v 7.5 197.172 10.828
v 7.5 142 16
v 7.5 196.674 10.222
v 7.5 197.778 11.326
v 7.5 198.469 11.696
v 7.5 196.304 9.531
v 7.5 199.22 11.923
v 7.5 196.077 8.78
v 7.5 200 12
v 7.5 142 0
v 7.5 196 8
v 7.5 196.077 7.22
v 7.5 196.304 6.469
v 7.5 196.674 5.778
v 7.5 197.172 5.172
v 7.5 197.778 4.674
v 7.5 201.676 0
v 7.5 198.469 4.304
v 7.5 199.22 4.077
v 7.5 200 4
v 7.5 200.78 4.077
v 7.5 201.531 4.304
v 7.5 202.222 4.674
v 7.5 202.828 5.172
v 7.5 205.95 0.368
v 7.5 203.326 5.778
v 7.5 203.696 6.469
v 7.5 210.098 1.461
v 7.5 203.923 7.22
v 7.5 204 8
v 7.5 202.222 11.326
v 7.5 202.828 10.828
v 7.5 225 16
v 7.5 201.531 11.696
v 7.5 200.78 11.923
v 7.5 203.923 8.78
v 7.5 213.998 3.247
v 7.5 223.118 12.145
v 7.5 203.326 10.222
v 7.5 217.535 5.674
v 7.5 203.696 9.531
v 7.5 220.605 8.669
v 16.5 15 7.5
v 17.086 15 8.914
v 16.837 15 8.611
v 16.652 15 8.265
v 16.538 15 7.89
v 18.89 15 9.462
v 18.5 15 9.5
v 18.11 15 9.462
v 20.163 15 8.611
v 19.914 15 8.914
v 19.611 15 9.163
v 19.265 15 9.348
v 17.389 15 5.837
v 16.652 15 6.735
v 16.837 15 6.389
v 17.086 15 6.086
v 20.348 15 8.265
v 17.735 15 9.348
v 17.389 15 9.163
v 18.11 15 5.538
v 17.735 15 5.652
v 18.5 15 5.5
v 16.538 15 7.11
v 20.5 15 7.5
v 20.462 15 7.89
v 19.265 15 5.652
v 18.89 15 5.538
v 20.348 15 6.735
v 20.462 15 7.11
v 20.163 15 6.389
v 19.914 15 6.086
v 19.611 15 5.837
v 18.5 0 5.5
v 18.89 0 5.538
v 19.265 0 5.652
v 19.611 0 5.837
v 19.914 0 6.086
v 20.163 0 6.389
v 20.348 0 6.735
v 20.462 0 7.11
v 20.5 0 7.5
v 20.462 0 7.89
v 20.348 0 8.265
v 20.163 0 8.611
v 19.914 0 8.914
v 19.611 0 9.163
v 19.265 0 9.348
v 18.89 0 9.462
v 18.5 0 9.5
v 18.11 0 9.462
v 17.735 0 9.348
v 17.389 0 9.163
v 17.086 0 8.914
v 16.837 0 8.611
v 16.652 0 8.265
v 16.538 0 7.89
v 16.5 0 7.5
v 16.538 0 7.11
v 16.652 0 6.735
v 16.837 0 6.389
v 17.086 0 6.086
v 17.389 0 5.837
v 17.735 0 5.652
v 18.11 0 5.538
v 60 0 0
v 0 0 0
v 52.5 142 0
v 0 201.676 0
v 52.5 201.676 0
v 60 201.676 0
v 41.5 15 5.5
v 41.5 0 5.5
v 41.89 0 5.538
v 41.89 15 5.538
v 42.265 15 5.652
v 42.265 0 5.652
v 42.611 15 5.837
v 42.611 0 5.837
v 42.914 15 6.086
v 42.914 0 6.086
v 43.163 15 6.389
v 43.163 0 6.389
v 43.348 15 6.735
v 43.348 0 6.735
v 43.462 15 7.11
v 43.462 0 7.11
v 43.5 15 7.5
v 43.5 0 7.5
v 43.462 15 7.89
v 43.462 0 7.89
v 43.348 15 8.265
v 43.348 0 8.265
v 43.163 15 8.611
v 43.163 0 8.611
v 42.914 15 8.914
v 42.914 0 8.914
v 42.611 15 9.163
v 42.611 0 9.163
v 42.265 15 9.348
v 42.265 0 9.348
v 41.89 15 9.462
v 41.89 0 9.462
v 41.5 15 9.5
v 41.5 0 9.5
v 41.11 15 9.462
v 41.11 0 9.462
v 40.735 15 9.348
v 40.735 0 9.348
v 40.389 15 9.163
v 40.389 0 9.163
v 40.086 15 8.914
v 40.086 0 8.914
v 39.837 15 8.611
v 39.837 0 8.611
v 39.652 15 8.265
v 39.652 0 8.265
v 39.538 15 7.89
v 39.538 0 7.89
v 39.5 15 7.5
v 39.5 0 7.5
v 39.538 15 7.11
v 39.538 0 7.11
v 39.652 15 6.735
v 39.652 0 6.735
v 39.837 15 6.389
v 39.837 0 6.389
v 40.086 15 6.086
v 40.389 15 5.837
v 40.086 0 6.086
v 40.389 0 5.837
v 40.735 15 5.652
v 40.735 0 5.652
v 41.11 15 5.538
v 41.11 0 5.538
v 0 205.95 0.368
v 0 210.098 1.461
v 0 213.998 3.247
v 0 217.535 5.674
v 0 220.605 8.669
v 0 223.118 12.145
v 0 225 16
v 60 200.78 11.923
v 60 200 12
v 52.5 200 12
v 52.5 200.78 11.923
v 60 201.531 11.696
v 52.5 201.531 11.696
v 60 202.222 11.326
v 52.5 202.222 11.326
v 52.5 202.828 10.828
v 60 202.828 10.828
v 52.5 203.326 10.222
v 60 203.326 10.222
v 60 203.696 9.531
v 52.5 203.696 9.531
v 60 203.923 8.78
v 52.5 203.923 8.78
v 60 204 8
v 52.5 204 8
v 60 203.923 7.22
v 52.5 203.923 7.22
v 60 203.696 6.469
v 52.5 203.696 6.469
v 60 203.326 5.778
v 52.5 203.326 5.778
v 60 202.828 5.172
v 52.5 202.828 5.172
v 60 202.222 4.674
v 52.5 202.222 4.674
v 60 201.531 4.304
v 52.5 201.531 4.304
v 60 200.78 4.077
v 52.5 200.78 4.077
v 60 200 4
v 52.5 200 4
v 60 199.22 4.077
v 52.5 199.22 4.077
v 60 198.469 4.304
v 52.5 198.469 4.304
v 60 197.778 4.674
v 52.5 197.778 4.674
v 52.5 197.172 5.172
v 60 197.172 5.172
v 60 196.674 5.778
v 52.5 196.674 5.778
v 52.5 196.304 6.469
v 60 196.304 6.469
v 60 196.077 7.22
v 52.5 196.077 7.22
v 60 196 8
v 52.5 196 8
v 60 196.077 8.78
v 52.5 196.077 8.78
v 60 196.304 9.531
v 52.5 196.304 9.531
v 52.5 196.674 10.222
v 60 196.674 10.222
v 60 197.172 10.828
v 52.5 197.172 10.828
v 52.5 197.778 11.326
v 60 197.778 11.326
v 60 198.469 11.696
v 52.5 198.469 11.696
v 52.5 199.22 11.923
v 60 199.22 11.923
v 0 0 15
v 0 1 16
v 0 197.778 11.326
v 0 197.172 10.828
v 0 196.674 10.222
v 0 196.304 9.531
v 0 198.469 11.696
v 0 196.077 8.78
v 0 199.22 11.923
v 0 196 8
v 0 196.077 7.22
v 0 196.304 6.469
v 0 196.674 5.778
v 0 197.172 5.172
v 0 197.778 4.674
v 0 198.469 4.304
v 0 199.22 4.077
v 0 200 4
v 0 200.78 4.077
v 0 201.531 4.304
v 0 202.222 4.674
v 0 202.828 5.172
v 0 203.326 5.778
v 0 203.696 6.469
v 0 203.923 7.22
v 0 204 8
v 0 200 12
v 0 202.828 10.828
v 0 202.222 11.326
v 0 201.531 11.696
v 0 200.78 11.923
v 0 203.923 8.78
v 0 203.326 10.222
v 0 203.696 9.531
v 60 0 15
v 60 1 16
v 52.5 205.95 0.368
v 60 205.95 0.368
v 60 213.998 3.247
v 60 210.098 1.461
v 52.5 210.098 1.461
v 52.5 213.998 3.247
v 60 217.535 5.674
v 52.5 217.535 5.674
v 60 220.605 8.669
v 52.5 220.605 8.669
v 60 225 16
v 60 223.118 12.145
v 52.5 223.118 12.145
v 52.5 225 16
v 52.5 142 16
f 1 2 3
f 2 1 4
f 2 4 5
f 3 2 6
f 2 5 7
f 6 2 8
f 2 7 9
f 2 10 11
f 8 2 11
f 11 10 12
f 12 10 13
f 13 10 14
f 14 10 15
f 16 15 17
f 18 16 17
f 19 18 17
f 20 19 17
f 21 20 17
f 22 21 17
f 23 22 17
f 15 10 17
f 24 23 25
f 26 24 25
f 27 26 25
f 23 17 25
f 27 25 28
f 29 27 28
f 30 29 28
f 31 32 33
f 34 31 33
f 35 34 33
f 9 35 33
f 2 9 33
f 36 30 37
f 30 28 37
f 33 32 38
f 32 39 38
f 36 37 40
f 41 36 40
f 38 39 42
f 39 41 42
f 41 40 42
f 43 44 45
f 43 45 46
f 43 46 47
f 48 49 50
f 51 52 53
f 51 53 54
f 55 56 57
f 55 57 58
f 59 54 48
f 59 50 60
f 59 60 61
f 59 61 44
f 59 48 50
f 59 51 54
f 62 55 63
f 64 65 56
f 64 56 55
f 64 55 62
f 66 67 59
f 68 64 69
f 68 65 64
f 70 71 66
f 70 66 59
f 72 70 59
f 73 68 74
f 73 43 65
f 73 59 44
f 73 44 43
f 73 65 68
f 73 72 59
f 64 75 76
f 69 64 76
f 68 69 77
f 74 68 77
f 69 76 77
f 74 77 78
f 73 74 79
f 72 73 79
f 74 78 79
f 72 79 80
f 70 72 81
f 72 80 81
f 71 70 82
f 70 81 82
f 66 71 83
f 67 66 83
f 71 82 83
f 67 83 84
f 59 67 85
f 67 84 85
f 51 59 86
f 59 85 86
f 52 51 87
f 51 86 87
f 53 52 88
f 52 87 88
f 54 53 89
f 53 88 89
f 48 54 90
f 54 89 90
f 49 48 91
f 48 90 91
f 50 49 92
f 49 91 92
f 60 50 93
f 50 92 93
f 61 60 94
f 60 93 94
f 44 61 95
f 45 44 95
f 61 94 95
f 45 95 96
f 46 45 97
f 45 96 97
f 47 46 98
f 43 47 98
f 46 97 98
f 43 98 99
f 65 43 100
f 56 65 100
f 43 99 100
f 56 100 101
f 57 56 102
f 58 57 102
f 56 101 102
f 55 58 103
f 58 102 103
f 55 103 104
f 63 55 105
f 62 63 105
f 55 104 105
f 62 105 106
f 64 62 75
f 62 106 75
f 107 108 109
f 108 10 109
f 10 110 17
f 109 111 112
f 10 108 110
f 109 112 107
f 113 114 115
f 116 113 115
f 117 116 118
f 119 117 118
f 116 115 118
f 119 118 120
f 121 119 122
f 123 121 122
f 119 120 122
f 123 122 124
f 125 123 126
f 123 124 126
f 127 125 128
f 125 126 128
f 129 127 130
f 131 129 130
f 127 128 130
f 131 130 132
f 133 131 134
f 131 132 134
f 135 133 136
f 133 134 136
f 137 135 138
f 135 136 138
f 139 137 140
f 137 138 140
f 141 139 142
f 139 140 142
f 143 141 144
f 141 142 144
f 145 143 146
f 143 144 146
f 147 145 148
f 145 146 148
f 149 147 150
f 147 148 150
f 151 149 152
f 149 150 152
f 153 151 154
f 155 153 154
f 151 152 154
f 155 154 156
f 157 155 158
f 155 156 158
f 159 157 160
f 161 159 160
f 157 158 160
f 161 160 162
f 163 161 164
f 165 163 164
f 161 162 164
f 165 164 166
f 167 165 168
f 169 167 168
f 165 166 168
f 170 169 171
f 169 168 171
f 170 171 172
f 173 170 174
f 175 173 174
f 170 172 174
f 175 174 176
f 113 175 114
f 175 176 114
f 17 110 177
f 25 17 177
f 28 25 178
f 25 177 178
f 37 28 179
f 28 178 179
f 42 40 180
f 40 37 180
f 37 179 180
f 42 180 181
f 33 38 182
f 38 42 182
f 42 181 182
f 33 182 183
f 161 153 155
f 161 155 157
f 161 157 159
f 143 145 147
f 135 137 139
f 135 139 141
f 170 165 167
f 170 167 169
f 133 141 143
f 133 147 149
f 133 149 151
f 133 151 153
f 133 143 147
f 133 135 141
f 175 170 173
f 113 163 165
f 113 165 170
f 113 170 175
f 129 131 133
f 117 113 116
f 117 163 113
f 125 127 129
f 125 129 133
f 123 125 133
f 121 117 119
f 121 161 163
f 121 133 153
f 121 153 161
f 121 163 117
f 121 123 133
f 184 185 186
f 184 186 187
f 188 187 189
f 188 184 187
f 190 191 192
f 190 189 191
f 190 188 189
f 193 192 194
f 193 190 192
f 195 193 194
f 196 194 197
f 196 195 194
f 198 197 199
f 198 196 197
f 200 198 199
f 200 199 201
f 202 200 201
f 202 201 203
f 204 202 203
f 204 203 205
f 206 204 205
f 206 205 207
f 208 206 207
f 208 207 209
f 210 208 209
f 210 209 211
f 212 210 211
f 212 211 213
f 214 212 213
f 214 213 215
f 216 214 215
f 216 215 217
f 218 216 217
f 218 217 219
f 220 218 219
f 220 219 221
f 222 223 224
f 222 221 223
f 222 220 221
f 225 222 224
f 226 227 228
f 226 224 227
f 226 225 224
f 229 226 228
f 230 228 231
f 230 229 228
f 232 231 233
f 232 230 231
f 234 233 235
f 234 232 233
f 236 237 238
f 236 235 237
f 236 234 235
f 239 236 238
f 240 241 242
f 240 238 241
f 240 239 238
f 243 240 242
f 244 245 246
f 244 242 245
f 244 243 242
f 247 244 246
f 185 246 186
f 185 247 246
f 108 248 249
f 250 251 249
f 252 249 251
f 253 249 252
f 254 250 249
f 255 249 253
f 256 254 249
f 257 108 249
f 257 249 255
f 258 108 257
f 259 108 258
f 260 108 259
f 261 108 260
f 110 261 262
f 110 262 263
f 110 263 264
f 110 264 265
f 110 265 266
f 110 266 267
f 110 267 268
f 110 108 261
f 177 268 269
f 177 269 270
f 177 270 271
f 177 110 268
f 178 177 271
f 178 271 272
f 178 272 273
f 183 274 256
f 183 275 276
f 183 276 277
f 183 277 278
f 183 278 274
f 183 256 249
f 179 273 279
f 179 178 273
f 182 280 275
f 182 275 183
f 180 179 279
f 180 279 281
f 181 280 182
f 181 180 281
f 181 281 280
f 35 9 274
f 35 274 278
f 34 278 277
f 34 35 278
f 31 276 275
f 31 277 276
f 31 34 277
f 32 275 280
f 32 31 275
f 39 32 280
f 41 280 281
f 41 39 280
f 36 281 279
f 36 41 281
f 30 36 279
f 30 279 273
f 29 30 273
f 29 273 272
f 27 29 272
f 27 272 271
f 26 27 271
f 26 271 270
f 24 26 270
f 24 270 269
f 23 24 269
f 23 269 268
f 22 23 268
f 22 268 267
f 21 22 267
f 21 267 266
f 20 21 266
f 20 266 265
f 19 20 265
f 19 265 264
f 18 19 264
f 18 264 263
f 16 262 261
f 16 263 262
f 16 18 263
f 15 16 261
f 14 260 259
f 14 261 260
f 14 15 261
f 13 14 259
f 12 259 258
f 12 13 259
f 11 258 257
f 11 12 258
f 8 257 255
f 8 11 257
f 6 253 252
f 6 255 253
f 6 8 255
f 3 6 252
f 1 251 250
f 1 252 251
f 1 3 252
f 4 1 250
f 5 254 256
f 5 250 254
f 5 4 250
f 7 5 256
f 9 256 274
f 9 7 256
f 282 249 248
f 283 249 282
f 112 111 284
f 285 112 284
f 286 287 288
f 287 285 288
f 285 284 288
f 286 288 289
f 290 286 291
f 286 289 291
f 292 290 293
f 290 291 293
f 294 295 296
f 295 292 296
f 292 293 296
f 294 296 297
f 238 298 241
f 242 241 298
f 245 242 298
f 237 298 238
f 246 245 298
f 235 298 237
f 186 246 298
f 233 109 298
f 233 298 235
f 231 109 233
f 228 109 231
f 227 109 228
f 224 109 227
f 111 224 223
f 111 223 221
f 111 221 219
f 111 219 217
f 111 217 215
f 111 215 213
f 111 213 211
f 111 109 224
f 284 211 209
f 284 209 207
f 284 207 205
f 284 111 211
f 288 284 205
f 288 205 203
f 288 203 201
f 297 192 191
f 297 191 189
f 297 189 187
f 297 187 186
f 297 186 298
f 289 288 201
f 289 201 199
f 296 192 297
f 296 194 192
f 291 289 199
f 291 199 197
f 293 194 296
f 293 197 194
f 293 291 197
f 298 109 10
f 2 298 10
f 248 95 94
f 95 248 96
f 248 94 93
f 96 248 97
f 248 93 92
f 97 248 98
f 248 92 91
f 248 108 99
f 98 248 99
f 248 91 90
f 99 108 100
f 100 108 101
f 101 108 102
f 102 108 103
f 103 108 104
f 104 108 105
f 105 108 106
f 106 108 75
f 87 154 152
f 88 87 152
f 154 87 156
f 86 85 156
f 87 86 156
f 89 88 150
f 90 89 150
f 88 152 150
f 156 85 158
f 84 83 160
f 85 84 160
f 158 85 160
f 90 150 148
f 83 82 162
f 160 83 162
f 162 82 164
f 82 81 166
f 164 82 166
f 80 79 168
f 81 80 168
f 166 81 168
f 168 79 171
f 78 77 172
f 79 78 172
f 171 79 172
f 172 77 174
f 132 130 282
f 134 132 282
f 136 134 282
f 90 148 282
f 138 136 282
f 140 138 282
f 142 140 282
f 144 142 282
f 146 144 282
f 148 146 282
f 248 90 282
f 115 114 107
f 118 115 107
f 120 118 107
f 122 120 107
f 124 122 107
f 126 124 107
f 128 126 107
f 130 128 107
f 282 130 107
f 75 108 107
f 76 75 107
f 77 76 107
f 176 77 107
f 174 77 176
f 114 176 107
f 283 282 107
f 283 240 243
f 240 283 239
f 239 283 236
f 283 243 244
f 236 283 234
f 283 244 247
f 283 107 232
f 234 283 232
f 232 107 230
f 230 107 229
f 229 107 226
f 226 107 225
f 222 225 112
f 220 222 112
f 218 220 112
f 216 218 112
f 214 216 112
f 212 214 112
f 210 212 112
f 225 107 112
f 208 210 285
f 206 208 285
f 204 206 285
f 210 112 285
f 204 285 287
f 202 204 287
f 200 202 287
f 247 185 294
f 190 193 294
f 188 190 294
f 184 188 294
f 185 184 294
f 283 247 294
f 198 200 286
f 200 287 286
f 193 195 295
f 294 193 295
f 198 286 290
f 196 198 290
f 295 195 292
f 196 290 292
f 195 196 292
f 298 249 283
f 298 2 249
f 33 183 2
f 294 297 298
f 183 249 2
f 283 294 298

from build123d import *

# Parameters (mm, degrees)
SKETCH1_W               = 60
SKETCH1_H               = 250
BOSS_EXTRUDE1_DEPTH     = 16
CHAMFER2_SIZE           = 1
SKETCH2_R               = 2
CUT_EXTRUDE1_DEPTH      = 15
SKETCH3_W               = 45
SKETCH3_H               = 50
CUT_EXTRUDE2_DEPTH      = 258.596583828
CUT_EXTRUDE3_DEPTH      = 256.953609078
CUT_EXTRUDE3_DEPTH_BACK = 256.953609078
SKETCH4_R               = 4
SKETCH5_W               = 60
SKETCH5_H               = 25
CUT_EXTRUDE4_DEPTH      = 258.596583828
ESBO_O1_W               = 45
ESBO_O1_H               = 33
CORTE_EXTRUS_O1_DEPTH   = 234.411653522
FILETE1_R               = 25


with BuildPart() as part:
    # Sketch1 → Boss-Extrude1 (new body)
    with BuildSketch(Plane.XY):
        with Locations((30, 125)):
            Rectangle(SKETCH1_W, SKETCH1_H)
    extrude(amount=BOSS_EXTRUDE1_DEPTH)

    # Chamfer2
    chamfer2_edges = [part.edges().sort_by_distance(p)[0] for p in [
        (30, 0, 16),
    ]]
    chamfer(chamfer2_edges, length=CHAMFER2_SIZE)

    # Sketch2 → Cut-Extrude1 (cut)
    with BuildSketch(Plane(origin=(0, 0, 0), x_dir=(-1, 0, 0), z_dir=(0, -1, 0))):
        with Locations(Location((-41.5, -7.5, 0), (0, 0, 90))):
            Circle(SKETCH2_R)
        with Locations(Location((-18.5, -7.5, 0), (0, 0, 90))):
            Circle(SKETCH2_R)
    extrude(amount=-CUT_EXTRUDE1_DEPTH, mode=Mode.SUBTRACT)

    # Sketch3 → Cut-Extrude2 (cut, through all)
    with BuildSketch(Plane(origin=(0, 0, 0), x_dir=(-1, 0, 0), z_dir=(0, 0, -1))):
        with Locations((-30, 200)):
            Rectangle(SKETCH3_W, SKETCH3_H)
    extrude(amount=-CUT_EXTRUDE2_DEPTH, mode=Mode.SUBTRACT)

    # Sketch4 → Cut-Extrude3 (cut, two sides: drawn at the far end of the back side and taken through both)
    with BuildSketch(Plane.ZY.offset(-52.5).offset(-CUT_EXTRUDE3_DEPTH_BACK)):
        with Locations((8, 200)):
            Circle(SKETCH4_R)
    extrude(amount=CUT_EXTRUDE3_DEPTH + CUT_EXTRUDE3_DEPTH_BACK, mode=Mode.SUBTRACT)

    # Sketch5 → Cut-Extrude4 (cut, through all)
    with BuildSketch(Plane(origin=(0, 0, 0), x_dir=(-1, 0, 0), z_dir=(0, 0, -1))):
        with Locations((-30, 237.5)):
            Rectangle(SKETCH5_W, SKETCH5_H)
    extrude(amount=-CUT_EXTRUDE4_DEPTH, mode=Mode.SUBTRACT)

    # Esboço1 → Corte-extrusão1 (cut, through all)
    with BuildSketch(Plane(origin=(0, 0, 0), x_dir=(-1, 0, 0), z_dir=(0, 0, -1))):
        with Locations((-30, 158.5)):
            Rectangle(ESBO_O1_W, ESBO_O1_H)
    extrude(amount=-CORTE_EXTRUS_O1_DEPTH, mode=Mode.SUBTRACT)

    # Filete1
    # the kernel refuses this fillet: 25 mm, written as the material it takes off along each edge
    with BuildSketch(Plane(origin=(-5.809518948, 225, 0), x_dir=(0, 0, 1), z_dir=(1, 0, 0)), Plane(origin=(-58.309518948, 225, 0), x_dir=(0, 0, 1), z_dir=(1, 0, 0))) as filete1_piece_1:
        with BuildLine():
            CenterArc((25, 23.323807579), FILETE1_R, 180, 68.899803976)
            Line((0, 23.323807579), (-0.5, 23.323807579))
            Line((-0.5, 23.323807579), (-0.5, 0))
            Line((-0.5, 0), (0, -0.5))
            ThreePointArc((0, -0.5), (8, -0.5), (15.82, -0.466476152))
            Line((15.82, -0.466476152), (16, 0))
        make_face()
    extrude(amount=124.119037897, mode=Mode.SUBTRACT)


solid = part.part
